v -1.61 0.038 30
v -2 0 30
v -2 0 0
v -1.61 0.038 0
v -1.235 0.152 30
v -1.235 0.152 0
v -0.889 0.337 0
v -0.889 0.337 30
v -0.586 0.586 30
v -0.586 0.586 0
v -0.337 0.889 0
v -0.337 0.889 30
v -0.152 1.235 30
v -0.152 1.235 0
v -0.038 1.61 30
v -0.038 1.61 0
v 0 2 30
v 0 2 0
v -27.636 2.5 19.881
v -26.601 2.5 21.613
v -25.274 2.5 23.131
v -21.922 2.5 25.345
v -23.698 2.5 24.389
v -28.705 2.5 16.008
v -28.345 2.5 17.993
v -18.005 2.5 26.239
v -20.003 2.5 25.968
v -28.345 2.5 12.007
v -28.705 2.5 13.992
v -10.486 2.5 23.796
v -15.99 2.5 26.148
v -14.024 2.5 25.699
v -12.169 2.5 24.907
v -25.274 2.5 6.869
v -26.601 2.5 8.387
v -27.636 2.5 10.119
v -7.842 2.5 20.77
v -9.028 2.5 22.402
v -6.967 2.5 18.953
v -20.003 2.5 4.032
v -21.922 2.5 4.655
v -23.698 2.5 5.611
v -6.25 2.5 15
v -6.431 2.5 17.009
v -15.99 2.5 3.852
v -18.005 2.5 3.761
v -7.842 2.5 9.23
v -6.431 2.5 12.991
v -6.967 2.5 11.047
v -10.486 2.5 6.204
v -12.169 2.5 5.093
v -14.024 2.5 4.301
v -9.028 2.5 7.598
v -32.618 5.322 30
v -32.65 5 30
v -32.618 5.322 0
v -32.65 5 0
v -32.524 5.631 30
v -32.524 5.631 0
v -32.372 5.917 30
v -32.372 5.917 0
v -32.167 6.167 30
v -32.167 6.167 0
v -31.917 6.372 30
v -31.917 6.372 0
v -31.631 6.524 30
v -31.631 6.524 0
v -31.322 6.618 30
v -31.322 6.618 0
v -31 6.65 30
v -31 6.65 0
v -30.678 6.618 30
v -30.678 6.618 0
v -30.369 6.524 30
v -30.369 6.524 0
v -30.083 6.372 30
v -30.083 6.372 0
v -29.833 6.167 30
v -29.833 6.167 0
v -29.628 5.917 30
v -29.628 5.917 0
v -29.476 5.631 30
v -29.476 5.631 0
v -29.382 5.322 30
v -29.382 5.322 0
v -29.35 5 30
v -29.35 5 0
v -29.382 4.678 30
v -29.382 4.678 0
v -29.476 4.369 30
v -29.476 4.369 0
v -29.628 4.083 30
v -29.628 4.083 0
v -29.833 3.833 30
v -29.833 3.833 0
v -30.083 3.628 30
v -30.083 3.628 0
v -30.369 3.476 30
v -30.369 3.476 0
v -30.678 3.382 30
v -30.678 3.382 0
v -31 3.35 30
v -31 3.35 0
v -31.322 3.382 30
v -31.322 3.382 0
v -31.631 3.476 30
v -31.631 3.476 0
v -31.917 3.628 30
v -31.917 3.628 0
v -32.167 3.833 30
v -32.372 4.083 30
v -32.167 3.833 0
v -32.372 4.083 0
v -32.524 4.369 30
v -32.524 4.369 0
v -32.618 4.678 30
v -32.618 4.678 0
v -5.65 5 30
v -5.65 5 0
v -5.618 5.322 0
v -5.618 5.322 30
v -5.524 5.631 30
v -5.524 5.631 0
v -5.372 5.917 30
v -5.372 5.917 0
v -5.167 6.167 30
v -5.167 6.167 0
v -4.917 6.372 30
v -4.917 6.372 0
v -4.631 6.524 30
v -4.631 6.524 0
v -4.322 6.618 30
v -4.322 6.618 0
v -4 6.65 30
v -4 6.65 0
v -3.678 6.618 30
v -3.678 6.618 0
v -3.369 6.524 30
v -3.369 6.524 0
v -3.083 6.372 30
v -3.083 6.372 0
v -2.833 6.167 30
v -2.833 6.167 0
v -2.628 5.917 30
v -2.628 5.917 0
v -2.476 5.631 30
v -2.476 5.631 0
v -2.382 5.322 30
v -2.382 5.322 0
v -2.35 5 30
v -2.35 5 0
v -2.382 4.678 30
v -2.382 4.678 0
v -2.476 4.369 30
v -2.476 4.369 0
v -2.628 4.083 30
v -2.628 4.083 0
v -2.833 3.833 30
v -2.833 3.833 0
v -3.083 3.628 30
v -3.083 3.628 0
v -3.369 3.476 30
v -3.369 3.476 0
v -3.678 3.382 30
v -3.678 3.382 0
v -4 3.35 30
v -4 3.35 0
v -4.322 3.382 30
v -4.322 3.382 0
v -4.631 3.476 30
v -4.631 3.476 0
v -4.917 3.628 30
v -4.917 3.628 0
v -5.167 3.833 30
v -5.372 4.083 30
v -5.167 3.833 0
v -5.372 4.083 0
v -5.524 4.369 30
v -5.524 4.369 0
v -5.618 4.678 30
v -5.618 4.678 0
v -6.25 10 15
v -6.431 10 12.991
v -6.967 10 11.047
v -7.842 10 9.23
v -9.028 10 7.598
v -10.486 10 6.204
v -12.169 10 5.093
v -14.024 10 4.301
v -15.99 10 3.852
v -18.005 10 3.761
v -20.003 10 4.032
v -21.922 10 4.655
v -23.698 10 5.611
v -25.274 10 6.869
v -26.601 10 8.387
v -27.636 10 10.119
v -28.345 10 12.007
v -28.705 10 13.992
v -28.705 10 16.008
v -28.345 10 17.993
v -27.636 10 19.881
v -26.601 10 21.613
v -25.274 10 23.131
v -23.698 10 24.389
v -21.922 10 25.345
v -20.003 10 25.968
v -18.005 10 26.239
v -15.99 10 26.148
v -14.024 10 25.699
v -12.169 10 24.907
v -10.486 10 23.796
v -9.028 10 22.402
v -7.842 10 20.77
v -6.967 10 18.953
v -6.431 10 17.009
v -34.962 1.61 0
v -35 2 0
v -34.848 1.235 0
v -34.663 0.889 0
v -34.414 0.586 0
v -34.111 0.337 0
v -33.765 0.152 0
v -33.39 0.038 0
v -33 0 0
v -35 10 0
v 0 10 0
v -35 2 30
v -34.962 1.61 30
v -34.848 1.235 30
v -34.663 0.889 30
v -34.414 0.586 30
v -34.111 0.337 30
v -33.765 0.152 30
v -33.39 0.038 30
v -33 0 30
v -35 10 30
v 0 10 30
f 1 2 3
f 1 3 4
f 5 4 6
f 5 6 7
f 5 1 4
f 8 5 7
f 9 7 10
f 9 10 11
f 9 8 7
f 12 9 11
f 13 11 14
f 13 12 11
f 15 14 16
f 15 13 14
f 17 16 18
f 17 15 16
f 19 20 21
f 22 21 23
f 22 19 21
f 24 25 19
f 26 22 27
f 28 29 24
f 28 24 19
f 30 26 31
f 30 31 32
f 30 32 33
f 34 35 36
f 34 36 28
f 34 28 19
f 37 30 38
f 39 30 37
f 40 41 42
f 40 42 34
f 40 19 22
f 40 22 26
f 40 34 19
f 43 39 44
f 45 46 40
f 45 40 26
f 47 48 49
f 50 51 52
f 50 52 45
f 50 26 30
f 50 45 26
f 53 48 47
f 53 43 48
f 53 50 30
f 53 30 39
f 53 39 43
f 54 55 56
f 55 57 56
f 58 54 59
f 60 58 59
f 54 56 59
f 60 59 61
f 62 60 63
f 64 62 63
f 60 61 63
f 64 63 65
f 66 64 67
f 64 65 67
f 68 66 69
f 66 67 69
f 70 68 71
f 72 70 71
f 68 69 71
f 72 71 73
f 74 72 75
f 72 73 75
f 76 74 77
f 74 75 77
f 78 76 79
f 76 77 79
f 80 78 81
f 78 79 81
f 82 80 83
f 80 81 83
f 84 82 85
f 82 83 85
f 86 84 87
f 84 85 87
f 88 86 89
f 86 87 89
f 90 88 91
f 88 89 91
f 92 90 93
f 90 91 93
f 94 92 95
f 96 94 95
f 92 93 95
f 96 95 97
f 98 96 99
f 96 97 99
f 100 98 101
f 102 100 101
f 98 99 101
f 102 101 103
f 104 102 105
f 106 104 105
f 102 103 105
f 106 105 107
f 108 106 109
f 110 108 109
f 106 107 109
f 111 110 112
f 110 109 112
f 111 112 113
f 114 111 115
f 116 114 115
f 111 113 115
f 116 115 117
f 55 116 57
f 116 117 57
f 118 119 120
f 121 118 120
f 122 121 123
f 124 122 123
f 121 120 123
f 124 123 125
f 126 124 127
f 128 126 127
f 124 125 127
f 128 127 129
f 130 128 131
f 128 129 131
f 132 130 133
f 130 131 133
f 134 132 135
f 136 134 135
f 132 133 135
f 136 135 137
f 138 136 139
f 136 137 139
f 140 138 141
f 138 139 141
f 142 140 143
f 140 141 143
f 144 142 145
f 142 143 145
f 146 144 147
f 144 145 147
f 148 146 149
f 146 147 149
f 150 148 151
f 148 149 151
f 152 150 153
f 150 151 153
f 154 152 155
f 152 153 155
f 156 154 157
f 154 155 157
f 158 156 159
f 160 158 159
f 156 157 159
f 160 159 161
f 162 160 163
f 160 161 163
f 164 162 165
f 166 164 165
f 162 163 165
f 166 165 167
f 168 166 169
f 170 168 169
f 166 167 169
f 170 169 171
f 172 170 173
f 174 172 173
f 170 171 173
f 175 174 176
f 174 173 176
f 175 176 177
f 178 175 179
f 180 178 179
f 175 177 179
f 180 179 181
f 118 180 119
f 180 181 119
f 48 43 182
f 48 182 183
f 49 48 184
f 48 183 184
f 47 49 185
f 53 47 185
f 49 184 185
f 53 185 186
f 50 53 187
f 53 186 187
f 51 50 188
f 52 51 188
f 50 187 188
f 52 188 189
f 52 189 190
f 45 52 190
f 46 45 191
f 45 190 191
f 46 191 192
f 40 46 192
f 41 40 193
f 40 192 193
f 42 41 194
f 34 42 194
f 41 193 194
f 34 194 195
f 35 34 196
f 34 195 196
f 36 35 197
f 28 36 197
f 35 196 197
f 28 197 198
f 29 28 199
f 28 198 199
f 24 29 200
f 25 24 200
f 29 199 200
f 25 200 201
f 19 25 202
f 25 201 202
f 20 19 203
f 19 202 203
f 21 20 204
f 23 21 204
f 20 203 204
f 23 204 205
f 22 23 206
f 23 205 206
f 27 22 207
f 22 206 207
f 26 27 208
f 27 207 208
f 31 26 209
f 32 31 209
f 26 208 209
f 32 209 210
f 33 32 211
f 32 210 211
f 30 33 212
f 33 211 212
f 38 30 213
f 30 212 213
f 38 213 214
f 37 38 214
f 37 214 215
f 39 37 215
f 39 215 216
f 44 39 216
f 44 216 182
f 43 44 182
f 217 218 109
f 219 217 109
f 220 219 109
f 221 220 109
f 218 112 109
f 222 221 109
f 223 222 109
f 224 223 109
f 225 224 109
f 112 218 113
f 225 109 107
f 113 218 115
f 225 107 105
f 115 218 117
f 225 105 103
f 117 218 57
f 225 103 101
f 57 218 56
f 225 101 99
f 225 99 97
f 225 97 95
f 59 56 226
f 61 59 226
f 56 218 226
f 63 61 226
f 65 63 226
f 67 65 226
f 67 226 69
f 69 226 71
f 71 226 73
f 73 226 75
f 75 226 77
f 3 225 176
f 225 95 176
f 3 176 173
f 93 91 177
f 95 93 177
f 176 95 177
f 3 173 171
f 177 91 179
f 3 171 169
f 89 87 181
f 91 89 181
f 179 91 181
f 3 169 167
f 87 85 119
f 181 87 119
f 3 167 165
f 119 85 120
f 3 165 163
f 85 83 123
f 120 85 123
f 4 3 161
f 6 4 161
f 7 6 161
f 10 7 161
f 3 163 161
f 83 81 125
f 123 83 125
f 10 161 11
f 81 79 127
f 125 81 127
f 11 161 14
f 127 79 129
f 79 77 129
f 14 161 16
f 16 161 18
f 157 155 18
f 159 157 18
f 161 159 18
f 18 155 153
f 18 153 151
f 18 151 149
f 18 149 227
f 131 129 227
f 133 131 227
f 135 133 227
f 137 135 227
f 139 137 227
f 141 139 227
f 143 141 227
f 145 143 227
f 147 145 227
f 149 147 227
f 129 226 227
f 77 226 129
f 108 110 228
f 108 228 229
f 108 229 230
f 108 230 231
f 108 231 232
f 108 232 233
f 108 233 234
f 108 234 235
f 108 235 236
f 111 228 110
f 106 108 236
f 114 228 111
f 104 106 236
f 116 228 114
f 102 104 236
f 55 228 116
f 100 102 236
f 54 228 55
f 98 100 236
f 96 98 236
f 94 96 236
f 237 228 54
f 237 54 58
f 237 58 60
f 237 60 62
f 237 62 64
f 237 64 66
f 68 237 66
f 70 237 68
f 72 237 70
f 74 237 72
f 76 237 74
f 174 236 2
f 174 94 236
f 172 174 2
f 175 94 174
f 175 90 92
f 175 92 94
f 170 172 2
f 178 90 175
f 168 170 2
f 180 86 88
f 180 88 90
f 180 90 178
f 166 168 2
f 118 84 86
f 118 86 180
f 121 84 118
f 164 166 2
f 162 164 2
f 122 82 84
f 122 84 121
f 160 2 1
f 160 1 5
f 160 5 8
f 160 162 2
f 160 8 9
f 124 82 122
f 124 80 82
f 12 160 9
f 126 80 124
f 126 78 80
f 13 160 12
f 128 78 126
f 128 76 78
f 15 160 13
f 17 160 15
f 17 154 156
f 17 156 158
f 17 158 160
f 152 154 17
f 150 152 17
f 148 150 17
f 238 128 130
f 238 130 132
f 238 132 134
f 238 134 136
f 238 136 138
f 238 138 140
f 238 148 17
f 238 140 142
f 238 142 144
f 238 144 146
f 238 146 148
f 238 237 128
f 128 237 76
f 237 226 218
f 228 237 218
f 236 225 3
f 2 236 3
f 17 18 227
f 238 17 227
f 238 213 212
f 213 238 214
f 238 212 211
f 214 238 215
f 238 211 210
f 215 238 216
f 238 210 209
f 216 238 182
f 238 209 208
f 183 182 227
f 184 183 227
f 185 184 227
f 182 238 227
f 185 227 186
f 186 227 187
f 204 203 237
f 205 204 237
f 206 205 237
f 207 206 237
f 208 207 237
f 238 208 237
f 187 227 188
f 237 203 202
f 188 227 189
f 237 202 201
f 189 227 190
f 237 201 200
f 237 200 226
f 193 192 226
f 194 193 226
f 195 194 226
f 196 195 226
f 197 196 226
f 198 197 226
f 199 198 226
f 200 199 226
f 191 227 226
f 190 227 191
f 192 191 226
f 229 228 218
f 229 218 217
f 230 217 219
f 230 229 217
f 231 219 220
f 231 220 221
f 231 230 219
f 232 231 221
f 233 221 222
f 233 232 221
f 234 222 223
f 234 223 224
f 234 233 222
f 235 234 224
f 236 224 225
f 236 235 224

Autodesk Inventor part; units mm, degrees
ref_plane "YZ Plane" through (0, 0, 0) normal (1, 0, 0) x (0, 1, 0)
ref_plane "XZ Plane" through (0, 0, 0) normal (0, 1, 0) x (-1, 0, 0)
ref_plane "XY Plane" through (0, 0, 0) normal (0, 0, 1) x (1, 0, 0)
sketch "Sketch1" plane through (0, 0, 0) normal (0, 0, 1) x (1, 0, 0)
  line L0 (-35, 0) -> (0, 0)
  line L1 (0, 0) -> (0, 10)
  line L2 (0, 10) -> (-35, 10)
  line L3 (-35, 10) -> (-35, 0)
  dimension "d0" = 35
  dimension "d1" = 10
extrude "Extrusion1" add sketch "Sketch1" along normal blind 30
sketch "Sketch2" plane through (-35, 10, 0) normal (0, 1, 0) x (1, 0, 0)
  line L0 (35, -30) -> (0, -30) construction
  line L1 (17.5, -30) -> (17.5, 0) construction
  line L2 (0, 0) -> (35, 0) construction
  circle A0 centre (17.5, -15) radius 11.25
  point P0 (30, -30)
  point P1 (5, -30)
  point P2 (5, 0)
  point P3 (30, 0)
  dimension "d5" = 22.5
extrude "Extrusion2" cut sketch "Sketch2" against normal blind 7.5
sketch "Sketch3" plane through (0, 0, 0) normal (0, 0, -1) x (-1, 0, 0)
  line L0 (0, 10) -> (35, 10) construction
  line L1 (17.5, 10) -> (17.5, 0) construction
  line L2 (30, 0) -> (5, 0) construction
  circle A0 centre (4, 5) radius 1.65
  circle A1 centre (31, 5) radius 1.65
  line L3 (0, 0) -> (0, 10) projected
  line L4 (35, 10) -> (35, 0) projected
  point P0 (5, 10)
  point P1 (30, 10)
  point P2 (17.5, 5)
  point P3 (0, 5)
  point P4 (35, 5)
  dimension "d8" = 3.3
  dimension "d9" = 4
  dimension "d10" = 4
extrude "Extrusion3" cut sketch "Sketch3" against normal through all
fillet "Fillet2" radius 2 2 edges at (-35, 0, 15) (0, 0, 15)
properties part number "servo_pressfit_plate"
